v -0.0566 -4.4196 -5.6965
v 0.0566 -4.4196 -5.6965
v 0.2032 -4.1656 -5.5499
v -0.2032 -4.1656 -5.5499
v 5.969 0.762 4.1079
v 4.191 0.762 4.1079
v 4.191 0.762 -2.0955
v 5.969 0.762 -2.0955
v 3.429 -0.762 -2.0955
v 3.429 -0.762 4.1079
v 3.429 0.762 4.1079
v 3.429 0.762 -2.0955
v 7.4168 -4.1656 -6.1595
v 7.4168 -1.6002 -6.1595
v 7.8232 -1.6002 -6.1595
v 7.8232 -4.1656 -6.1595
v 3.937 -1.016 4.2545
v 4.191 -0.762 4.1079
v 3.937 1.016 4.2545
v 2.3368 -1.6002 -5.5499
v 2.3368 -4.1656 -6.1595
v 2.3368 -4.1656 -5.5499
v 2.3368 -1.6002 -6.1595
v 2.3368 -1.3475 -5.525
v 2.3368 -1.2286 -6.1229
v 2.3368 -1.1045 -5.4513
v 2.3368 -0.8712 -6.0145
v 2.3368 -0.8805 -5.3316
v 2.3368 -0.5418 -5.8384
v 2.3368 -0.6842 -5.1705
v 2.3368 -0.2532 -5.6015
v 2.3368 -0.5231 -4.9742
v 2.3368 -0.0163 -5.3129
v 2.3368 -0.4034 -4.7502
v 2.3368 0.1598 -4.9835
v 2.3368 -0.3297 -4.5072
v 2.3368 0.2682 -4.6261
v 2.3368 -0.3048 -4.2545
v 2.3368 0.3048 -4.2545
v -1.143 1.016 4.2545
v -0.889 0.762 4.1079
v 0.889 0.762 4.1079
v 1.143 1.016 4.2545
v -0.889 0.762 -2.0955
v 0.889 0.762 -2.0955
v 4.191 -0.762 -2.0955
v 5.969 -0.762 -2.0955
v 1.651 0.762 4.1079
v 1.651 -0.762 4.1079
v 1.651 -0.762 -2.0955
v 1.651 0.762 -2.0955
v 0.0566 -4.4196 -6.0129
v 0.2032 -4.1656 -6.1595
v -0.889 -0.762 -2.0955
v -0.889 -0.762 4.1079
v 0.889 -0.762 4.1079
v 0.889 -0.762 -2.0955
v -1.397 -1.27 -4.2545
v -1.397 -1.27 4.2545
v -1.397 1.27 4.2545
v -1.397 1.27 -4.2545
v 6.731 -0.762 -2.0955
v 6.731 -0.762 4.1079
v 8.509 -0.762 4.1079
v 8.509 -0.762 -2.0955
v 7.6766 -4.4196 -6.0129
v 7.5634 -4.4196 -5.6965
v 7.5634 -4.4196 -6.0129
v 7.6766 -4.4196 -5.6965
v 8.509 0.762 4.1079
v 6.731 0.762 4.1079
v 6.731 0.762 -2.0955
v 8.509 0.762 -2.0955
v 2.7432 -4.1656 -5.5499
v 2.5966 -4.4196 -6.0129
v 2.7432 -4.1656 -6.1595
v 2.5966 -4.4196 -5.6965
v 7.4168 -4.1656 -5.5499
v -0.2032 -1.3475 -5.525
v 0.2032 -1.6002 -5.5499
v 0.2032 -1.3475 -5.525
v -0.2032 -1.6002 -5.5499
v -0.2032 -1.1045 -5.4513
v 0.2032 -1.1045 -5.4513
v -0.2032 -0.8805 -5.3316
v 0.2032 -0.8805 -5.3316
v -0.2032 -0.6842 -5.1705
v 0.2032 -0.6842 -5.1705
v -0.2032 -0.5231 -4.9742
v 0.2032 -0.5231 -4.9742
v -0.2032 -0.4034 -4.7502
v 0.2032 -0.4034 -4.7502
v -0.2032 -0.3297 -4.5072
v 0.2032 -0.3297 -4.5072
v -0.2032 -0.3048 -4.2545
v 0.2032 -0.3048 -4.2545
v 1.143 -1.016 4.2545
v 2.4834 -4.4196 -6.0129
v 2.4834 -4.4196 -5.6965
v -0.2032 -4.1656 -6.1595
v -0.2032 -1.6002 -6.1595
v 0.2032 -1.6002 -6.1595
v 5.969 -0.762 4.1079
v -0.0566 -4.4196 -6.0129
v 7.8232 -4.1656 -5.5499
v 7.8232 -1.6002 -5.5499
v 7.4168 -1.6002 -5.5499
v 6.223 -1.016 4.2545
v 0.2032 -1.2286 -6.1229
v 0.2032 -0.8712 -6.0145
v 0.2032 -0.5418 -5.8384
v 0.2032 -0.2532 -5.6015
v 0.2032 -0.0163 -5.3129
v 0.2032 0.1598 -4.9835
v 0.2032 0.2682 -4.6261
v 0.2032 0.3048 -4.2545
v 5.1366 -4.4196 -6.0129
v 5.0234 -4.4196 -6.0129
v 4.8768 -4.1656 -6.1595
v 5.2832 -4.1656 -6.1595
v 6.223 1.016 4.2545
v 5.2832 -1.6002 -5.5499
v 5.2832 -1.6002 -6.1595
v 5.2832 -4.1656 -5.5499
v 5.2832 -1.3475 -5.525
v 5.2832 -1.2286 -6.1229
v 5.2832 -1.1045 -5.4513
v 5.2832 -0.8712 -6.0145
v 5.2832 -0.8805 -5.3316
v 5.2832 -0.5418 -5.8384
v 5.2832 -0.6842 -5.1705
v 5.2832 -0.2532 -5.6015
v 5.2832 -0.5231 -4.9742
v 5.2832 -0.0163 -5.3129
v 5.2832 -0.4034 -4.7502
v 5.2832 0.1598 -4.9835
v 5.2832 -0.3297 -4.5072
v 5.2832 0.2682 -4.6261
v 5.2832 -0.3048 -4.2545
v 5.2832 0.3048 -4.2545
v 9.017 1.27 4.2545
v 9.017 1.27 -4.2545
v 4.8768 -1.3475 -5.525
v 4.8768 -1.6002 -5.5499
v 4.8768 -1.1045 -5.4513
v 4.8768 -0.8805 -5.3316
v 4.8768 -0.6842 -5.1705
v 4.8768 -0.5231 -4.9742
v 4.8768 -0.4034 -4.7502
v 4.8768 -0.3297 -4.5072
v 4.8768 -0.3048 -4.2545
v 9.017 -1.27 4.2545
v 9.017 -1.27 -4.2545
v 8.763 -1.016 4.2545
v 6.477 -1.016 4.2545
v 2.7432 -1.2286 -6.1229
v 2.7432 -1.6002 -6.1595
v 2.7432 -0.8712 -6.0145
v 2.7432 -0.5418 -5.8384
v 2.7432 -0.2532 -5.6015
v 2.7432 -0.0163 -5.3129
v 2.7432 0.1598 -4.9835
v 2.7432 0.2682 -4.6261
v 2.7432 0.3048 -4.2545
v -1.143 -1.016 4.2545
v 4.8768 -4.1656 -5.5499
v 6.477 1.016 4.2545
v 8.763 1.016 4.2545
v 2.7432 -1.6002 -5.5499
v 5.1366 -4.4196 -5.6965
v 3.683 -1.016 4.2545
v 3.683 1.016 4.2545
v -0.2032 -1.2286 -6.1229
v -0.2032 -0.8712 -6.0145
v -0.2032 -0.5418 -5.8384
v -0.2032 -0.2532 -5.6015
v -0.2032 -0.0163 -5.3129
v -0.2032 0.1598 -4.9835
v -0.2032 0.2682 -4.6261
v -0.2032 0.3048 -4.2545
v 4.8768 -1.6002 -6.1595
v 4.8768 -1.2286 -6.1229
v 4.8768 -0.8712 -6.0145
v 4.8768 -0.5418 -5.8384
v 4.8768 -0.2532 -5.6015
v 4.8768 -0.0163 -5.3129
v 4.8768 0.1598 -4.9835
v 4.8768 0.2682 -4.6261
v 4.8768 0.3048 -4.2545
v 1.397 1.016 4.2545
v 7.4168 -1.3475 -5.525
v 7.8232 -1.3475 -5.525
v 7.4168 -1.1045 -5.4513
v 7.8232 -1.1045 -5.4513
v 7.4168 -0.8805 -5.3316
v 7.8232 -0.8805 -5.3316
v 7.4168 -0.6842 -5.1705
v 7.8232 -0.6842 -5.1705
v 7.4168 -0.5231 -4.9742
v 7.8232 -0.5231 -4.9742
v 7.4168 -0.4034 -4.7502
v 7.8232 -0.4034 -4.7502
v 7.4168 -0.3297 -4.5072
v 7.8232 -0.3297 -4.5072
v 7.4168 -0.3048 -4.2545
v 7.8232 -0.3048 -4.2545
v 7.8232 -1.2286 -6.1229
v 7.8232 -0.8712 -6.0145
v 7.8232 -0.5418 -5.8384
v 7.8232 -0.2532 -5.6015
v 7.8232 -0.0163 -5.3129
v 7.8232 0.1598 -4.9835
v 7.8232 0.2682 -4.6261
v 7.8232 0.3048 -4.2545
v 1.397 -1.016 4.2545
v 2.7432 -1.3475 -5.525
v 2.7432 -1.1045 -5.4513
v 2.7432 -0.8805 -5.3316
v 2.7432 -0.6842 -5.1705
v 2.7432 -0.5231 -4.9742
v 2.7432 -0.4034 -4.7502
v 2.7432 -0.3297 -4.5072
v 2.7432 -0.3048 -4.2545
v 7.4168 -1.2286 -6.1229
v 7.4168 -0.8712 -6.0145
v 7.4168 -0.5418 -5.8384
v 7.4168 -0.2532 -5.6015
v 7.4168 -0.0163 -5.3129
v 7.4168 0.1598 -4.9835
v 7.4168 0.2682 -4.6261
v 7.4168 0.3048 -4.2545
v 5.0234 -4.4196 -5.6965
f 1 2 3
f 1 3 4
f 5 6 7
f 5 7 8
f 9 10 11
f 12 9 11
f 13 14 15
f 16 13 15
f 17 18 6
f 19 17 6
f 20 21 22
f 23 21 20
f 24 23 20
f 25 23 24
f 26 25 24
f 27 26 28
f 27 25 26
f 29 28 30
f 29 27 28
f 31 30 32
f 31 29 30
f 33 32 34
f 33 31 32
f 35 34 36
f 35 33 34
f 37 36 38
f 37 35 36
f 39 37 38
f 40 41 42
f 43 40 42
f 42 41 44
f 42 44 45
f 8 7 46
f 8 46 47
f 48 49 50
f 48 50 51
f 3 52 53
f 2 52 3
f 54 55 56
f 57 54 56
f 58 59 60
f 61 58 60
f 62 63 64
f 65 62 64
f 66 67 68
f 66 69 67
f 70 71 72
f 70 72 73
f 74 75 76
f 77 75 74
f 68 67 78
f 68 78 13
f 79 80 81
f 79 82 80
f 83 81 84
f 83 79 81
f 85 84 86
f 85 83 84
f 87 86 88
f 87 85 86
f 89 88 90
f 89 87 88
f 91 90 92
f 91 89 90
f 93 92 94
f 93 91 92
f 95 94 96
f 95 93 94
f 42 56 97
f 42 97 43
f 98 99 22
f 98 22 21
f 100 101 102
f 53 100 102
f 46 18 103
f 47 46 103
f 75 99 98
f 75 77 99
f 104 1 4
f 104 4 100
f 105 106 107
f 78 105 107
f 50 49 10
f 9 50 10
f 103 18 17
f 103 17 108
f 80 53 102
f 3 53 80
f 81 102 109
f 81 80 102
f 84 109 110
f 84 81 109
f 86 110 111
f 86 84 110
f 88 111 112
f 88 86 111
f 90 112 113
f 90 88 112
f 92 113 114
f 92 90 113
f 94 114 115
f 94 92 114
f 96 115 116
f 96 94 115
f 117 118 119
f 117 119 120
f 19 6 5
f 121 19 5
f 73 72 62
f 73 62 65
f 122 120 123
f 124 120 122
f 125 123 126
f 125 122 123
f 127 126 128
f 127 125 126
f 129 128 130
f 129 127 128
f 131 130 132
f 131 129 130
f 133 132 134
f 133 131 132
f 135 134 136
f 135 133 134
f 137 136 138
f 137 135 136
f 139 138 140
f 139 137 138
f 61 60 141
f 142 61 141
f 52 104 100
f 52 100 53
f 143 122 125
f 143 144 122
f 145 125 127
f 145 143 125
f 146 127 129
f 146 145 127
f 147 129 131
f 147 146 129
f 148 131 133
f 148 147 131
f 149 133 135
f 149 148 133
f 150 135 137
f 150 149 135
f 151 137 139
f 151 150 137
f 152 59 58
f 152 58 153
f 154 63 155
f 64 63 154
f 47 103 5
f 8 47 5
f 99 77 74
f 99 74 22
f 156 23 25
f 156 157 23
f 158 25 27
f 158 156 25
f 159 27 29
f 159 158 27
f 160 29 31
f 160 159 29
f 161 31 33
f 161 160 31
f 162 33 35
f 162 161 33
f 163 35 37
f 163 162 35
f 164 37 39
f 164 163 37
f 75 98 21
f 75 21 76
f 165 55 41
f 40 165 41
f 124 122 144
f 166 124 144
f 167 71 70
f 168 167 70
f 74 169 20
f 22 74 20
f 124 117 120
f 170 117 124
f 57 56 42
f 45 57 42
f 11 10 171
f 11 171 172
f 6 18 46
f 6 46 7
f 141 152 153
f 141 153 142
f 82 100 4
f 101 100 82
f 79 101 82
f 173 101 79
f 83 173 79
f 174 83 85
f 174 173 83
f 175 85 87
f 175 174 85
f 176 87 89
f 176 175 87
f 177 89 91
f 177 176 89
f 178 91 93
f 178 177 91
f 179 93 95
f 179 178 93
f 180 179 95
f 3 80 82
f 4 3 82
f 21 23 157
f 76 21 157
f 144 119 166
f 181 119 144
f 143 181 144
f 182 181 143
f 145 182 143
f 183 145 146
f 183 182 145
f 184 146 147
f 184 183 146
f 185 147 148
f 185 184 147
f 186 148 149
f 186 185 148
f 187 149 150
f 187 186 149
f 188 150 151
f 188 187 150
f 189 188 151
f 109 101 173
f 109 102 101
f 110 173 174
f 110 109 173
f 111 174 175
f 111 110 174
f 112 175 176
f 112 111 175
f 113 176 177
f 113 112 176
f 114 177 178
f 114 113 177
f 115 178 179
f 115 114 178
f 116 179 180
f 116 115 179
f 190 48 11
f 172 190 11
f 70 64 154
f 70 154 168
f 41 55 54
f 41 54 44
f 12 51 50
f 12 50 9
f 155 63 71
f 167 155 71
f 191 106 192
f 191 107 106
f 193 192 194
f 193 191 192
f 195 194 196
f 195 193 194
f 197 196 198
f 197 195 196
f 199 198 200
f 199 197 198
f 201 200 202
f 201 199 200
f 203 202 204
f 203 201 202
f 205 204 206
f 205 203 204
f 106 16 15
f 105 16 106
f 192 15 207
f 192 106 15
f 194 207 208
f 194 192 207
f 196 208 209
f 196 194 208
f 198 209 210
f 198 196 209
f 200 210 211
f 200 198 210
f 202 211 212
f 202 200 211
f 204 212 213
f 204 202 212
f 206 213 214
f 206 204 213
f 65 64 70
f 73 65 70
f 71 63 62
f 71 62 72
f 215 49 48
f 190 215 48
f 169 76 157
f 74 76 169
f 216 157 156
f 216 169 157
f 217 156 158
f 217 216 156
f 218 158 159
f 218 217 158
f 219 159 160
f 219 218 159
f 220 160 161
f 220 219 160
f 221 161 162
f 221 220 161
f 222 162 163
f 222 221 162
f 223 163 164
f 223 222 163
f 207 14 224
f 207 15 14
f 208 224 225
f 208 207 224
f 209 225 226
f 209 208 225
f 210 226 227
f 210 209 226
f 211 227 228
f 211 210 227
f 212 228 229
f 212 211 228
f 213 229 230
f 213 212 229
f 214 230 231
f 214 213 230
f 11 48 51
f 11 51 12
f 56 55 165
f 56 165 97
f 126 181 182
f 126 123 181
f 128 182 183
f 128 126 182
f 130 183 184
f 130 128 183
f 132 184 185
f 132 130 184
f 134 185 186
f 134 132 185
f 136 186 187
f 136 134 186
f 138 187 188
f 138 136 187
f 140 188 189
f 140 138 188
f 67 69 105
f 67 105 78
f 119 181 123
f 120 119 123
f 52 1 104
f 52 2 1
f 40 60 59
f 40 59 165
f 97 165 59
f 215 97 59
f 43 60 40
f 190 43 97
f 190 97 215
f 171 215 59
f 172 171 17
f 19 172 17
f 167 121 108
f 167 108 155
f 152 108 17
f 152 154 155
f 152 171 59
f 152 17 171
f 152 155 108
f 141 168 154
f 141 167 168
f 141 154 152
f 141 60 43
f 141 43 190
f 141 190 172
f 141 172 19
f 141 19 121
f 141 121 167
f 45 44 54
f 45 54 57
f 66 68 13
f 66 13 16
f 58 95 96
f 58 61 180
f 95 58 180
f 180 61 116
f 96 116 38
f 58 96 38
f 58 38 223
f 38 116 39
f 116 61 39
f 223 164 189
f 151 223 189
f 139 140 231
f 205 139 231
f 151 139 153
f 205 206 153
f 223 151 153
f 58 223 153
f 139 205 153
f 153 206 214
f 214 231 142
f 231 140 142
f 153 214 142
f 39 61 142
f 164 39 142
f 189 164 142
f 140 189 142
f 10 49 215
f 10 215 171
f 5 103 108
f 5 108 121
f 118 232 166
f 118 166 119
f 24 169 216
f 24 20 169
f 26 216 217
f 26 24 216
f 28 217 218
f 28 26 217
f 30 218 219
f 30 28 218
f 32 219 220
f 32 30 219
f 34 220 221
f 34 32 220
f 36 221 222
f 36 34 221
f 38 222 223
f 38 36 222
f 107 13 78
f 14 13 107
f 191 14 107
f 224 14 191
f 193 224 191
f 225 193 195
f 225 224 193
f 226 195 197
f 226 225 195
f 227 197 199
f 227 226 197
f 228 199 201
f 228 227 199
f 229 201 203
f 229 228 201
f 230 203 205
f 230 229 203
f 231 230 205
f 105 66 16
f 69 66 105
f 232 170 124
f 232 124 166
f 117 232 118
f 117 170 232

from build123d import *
from OCP.BRepFilletAPI import BRepFilletAPI_MakeChamfer

# Parameters (mm, degrees)
SKETCH1_W                   = 2.794
SKETCH1_H                   = 2.54
BOSS_EXTRUDE1_DEPTH         = 4.2545
SKETCH3_W                   = 0.4064
SKETCH3_H                   = 0.6096
CHAMFER1_SIZE               = 0.254
CHAMFER1_SIZE2              = 0.146646968
SKETCH4_W                   = 1.778
SKETCH4_H                   = 1.524
CUT_EXTRUDE1_DEPTH          = 6.35
CHAMFER2_SIZE               = 0.254
CHAMFER2_SIZE2              = 0.146646968
LPATTERN1_COUNT             = 4
LPATTERN1_PITCH             = 2.54
CHAMFER1_OF_LPATTERN1_SIZE  = 0.254
CHAMFER1_OF_LPATTERN1_SIZE2 = 0.146646968
CHAMFER2_OF_LPATTERN1_SIZE2 = 0.146646968
CHAMFER2_OF_LPATTERN1_SIZE  = 0.254


with BuildPart() as part:
    # Sketch1 → Boss-Extrude1 (new, symmetric)
    with BuildSketch(Plane.XY):
        Rectangle(SKETCH1_W, SKETCH1_H)
    boss_extrude1 = extrude(amount=BOSS_EXTRUDE1_DEPTH, both=True)

    # Sweep1: sweep along a path in Sketch2
    with BuildLine(Plane(origin=(0, 0, 0), x_dir=(0, 0, -1), z_dir=(1, 0, 0))) as sweep1_path:
        Line((5.8547, -4.4196), (5.8547, -1.6002))
        ThreePointArc((5.8547, -1.6002), (5.386012271, -0.468687729), (4.2545, 0))
    # Sketch3 → Sweep1 (sweep)
    with BuildSketch(Plane(origin=(0, 0, -4.2545), x_dir=(-1, 0, 0), z_dir=(0, 0, -1))):
        Rectangle(SKETCH3_W, SKETCH3_H)
    sweep1 = sweep(path=sweep1_path.line)

    # Chamfer1: one chamfer whose edges measure the first distance from different faces: ONE call of the kernel's chamfer builder (chamfer() names one face for all edges)
    chamfer1_edges_1 = [part.edges().sort_by_distance(p)[0] for p in [
        (-0.2032, -4.4196, -5.8547),
    ]]
    chamfer1_side_1 = [part.faces().sort_by_distance(p)[0] for p in [
        (-0.2032, -1.859510613, -5.586438348),
    ]]
    chamfer1_edges_2 = [part.edges().sort_by_distance(p)[0] for p in [
        (0, -4.4196, -6.1595),
    ]]
    chamfer1_side_2 = [part.faces().sort_by_distance(p)[0] for p in [
        (0, -3.0099, -6.1595),
    ]]
    chamfer1_edges_3 = [part.edges().sort_by_distance(p)[0] for p in [
        (0.2032, -4.4196, -5.8547),
    ]]
    chamfer1_side_3 = [part.faces().sort_by_distance(p)[0] for p in [
        (0.2032, -1.859510613, -5.586438348),
    ]]
    chamfer1_edges_4 = [part.edges().sort_by_distance(p)[0] for p in [
        (0, -4.4196, -5.5499),
    ]]
    chamfer1_side_4 = [part.faces().sort_by_distance(p)[0] for p in [
        (0, -3.0099, -5.5499),
    ]]
    chamfer1 = BRepFilletAPI_MakeChamfer(part.part.solid().wrapped)
    for e in chamfer1_edges_1:
        chamfer1.Add(CHAMFER1_SIZE, CHAMFER1_SIZE2, e.wrapped, chamfer1_side_1[0].wrapped)  # the first distance lies on this face
    for e in chamfer1_edges_2:
        chamfer1.Add(CHAMFER1_SIZE, CHAMFER1_SIZE2, e.wrapped, chamfer1_side_2[0].wrapped)  # the first distance lies on this face
    for e in chamfer1_edges_3:
        chamfer1.Add(CHAMFER1_SIZE, CHAMFER1_SIZE2, e.wrapped, chamfer1_side_3[0].wrapped)  # the first distance lies on this face
    for e in chamfer1_edges_4:
        chamfer1.Add(CHAMFER1_SIZE, CHAMFER1_SIZE2, e.wrapped, chamfer1_side_4[0].wrapped)  # the first distance lies on this face
    add(Compound.cast(chamfer1.Shape()), mode=Mode.REPLACE)

    # Sketch4 → Cut-Extrude1 (cut)
    with BuildSketch(Plane.XY.offset(4.2545)):
        Rectangle(SKETCH4_W, SKETCH4_H)
    cut_extrude1 = extrude(amount=-CUT_EXTRUDE1_DEPTH, mode=Mode.SUBTRACT)

    # Chamfer2
    chamfer2_edges = [part.edges().sort_by_distance(p)[0] for p in [
        (0.889, 0, 4.2545),
        (0, 0.762, 4.2545),
        (-0.889, 0, 4.2545),
        (0, -0.762, 4.2545),
    ]]
    chamfer2_side = [part.faces().sort_by_distance(p)[0] for p in [
        (0, -1.232240185, 4.2545),
    ]]
    chamfer(chamfer2_edges, length=CHAMFER2_SIZE, length2=CHAMFER2_SIZE2, reference=chamfer2_side[0])

    # LPattern1: Boss-Extrude1, Sweep1, Cut-Extrude1 ×4
    with Locations(*[(i * LPATTERN1_PITCH, 0, 0) for i in range(1, LPATTERN1_COUNT)]):
        add(boss_extrude1)
        add(sweep1)
        add(cut_extrude1, mode=Mode.SUBTRACT)

    # Chamfer1 of LPattern1: one chamfer whose edges measure the first distance from different faces: ONE call of the kernel's chamfer builder (chamfer() names one face for all edges)
    chamfer1_of_lpattern1_edges_1 = [part.edges().sort_by_distance(p)[0] for p in [
        (2.3368, -4.4196, -5.8547),
    ]]
    chamfer1_of_lpattern1_side_1 = [part.faces().sort_by_distance(p)[0] for p in [
        (2.3368, -1.859510613, -5.586438348),
    ]]
    chamfer1_of_lpattern1_edges_2 = [part.edges().sort_by_distance(p)[0] for p in [
        (2.54, -4.4196, -6.1595),
    ]]
    chamfer1_of_lpattern1_side_2 = [part.faces().sort_by_distance(p)[0] for p in [
        (2.54, -3.0099, -6.1595),
    ]]
    chamfer1_of_lpattern1_edges_3 = [part.edges().sort_by_distance(p)[0] for p in [
        (2.7432, -4.4196, -5.8547),
    ]]
    chamfer1_of_lpattern1_side_3 = [part.faces().sort_by_distance(p)[0] for p in [
        (2.7432, -1.859510613, -5.586438348),
    ]]
    chamfer1_of_lpattern1_edges_4 = [part.edges().sort_by_distance(p)[0] for p in [
        (2.54, -4.4196, -5.5499),
    ]]
    chamfer1_of_lpattern1_side_4 = [part.faces().sort_by_distance(p)[0] for p in [
        (2.54, -3.0099, -5.5499),
    ]]
    chamfer1_of_lpattern1_edges_5 = [part.edges().sort_by_distance(p)[0] for p in [
        (4.8768, -4.4196, -5.8547),
    ]]
    chamfer1_of_lpattern1_side_5 = [part.faces().sort_by_distance(p)[0] for p in [
        (4.8768, -1.859510613, -5.586438348),
    ]]
    chamfer1_of_lpattern1_edges_6 = [part.edges().sort_by_distance(p)[0] for p in [
        (5.08, -4.4196, -6.1595),
    ]]
    chamfer1_of_lpattern1_side_6 = [part.faces().sort_by_distance(p)[0] for p in [
        (5.08, -3.0099, -6.1595),
    ]]
    chamfer1_of_lpattern1_edges_7 = [part.edges().sort_by_distance(p)[0] for p in [
        (5.2832, -4.4196, -5.8547),
    ]]
    chamfer1_of_lpattern1_side_7 = [part.faces().sort_by_distance(p)[0] for p in [
        (5.2832, -1.859510613, -5.586438348),
    ]]
    chamfer1_of_lpattern1_edges_8 = [part.edges().sort_by_distance(p)[0] for p in [
        (5.08, -4.4196, -5.5499),
    ]]
    chamfer1_of_lpattern1_side_8 = [part.faces().sort_by_distance(p)[0] for p in [
        (5.08, -3.0099, -5.5499),
    ]]
    chamfer1_of_lpattern1_edges_9 = [part.edges().sort_by_distance(p)[0] for p in [
        (7.4168, -4.4196, -5.8547),
    ]]
    chamfer1_of_lpattern1_side_9 = [part.faces().sort_by_distance(p)[0] for p in [
        (7.4168, -1.859510613, -5.586438348),
    ]]
    chamfer1_of_lpattern1_edges_10 = [part.edges().sort_by_distance(p)[0] for p in [
        (7.62, -4.4196, -6.1595),
    ]]
    chamfer1_of_lpattern1_side_10 = [part.faces().sort_by_distance(p)[0] for p in [
        (7.62, -3.0099, -6.1595),
    ]]
    chamfer1_of_lpattern1_edges_11 = [part.edges().sort_by_distance(p)[0] for p in [
        (7.8232, -4.4196, -5.8547),
    ]]
    chamfer1_of_lpattern1_side_11 = [part.faces().sort_by_distance(p)[0] for p in [
        (7.8232, -1.859510613, -5.586438348),
    ]]
    chamfer1_of_lpattern1_edges_12 = [part.edges().sort_by_distance(p)[0] for p in [
        (7.62, -4.4196, -5.5499),
    ]]
    chamfer1_of_lpattern1_side_12 = [part.faces().sort_by_distance(p)[0] for p in [
        (7.62, -3.0099, -5.5499),
    ]]
    chamfer1_of_lpattern1 = BRepFilletAPI_MakeChamfer(part.part.solid().wrapped)
    for e in chamfer1_of_lpattern1_edges_1:
        chamfer1_of_lpattern1.Add(CHAMFER1_OF_LPATTERN1_SIZE, CHAMFER1_OF_LPATTERN1_SIZE2, e.wrapped, chamfer1_of_lpattern1_side_1[0].wrapped)  # the first distance lies on this face
    for e in chamfer1_of_lpattern1_edges_2:
        chamfer1_of_lpattern1.Add(CHAMFER1_OF_LPATTERN1_SIZE, CHAMFER1_OF_LPATTERN1_SIZE2, e.wrapped, chamfer1_of_lpattern1_side_2[0].wrapped)  # the first distance lies on this face
    for e in chamfer1_of_lpattern1_edges_3:
        chamfer1_of_lpattern1.Add(CHAMFER1_OF_LPATTERN1_SIZE, CHAMFER1_OF_LPATTERN1_SIZE2, e.wrapped, chamfer1_of_lpattern1_side_3[0].wrapped)  # the first distance lies on this face
    for e in chamfer1_of_lpattern1_edges_4:
        chamfer1_of_lpattern1.Add(CHAMFER1_OF_LPATTERN1_SIZE, CHAMFER1_OF_LPATTERN1_SIZE2, e.wrapped, chamfer1_of_lpattern1_side_4[0].wrapped)  # the first distance lies on this face
    for e in chamfer1_of_lpattern1_edges_5:
        chamfer1_of_lpattern1.Add(CHAMFER1_OF_LPATTERN1_SIZE, CHAMFER1_OF_LPATTERN1_SIZE2, e.wrapped, chamfer1_of_lpattern1_side_5[0].wrapped)  # the first distance lies on this face
    for e in chamfer1_of_lpattern1_edges_6:
        chamfer1_of_lpattern1.Add(CHAMFER1_OF_LPATTERN1_SIZE, CHAMFER1_OF_LPATTERN1_SIZE2, e.wrapped, chamfer1_of_lpattern1_side_6[0].wrapped)  # the first distance lies on this face
    for e in chamfer1_of_lpattern1_edges_7:
        chamfer1_of_lpattern1.Add(CHAMFER1_OF_LPATTERN1_SIZE, CHAMFER1_OF_LPATTERN1_SIZE2, e.wrapped, chamfer1_of_lpattern1_side_7[0].wrapped)  # the first distance lies on this face
    for e in chamfer1_of_lpattern1_edges_8:
        chamfer1_of_lpattern1.Add(CHAMFER1_OF_LPATTERN1_SIZE, CHAMFER1_OF_LPATTERN1_SIZE2, e.wrapped, chamfer1_of_lpattern1_side_8[0].wrapped)  # the first distance lies on this face
    for e in chamfer1_of_lpattern1_edges_9:
        chamfer1_of_lpattern1.Add(CHAMFER1_OF_LPATTERN1_SIZE, CHAMFER1_OF_LPATTERN1_SIZE2, e.wrapped, chamfer1_of_lpattern1_side_9[0].wrapped)  # the first distance lies on this face
    for e in chamfer1_of_lpattern1_edges_10:
        chamfer1_of_lpattern1.Add(CHAMFER1_OF_LPATTERN1_SIZE, CHAMFER1_OF_LPATTERN1_SIZE2, e.wrapped, chamfer1_of_lpattern1_side_10[0].wrapped)  # the first distance lies on this face
    for e in chamfer1_of_lpattern1_edges_11:
        chamfer1_of_lpattern1.Add(CHAMFER1_OF_LPATTERN1_SIZE, CHAMFER1_OF_LPATTERN1_SIZE2, e.wrapped, chamfer1_of_lpattern1_side_11[0].wrapped)  # the first distance lies on this face
    for e in chamfer1_of_lpattern1_edges_12:
        chamfer1_of_lpattern1.Add(CHAMFER1_OF_LPATTERN1_SIZE, CHAMFER1_OF_LPATTERN1_SIZE2, e.wrapped, chamfer1_of_lpattern1_side_12[0].wrapped)  # the first distance lies on this face
    add(Compound.cast(chamfer1_of_lpattern1.Shape()), mode=Mode.REPLACE)

    # Chamfer2 of LPattern1
    chamfer2_of_lpattern1_edges = [part.edges().sort_by_distance(p)[0] for p in [
        (3.429, 0, 4.2545),
        (2.54, 0.762, 4.2545),
        (1.651, 0, 4.2545),
        (2.54, -0.762, 4.2545),
        (5.969, 0, 4.2545),
        (5.08, 0.762, 4.2545),
        (4.191, 0, 4.2545),
        (5.08, -0.762, 4.2545),
        (8.509, 0, 4.2545),
        (7.62, 0.762, 4.2545),
        (6.731, 0, 4.2545),
        (7.62, -0.762, 4.2545),
    ]]
    chamfer(chamfer2_of_lpattern1_edges, length=CHAMFER2_OF_LPATTERN1_SIZE, length2=CHAMFER2_OF_LPATTERN1_SIZE2)


solid = part.part
